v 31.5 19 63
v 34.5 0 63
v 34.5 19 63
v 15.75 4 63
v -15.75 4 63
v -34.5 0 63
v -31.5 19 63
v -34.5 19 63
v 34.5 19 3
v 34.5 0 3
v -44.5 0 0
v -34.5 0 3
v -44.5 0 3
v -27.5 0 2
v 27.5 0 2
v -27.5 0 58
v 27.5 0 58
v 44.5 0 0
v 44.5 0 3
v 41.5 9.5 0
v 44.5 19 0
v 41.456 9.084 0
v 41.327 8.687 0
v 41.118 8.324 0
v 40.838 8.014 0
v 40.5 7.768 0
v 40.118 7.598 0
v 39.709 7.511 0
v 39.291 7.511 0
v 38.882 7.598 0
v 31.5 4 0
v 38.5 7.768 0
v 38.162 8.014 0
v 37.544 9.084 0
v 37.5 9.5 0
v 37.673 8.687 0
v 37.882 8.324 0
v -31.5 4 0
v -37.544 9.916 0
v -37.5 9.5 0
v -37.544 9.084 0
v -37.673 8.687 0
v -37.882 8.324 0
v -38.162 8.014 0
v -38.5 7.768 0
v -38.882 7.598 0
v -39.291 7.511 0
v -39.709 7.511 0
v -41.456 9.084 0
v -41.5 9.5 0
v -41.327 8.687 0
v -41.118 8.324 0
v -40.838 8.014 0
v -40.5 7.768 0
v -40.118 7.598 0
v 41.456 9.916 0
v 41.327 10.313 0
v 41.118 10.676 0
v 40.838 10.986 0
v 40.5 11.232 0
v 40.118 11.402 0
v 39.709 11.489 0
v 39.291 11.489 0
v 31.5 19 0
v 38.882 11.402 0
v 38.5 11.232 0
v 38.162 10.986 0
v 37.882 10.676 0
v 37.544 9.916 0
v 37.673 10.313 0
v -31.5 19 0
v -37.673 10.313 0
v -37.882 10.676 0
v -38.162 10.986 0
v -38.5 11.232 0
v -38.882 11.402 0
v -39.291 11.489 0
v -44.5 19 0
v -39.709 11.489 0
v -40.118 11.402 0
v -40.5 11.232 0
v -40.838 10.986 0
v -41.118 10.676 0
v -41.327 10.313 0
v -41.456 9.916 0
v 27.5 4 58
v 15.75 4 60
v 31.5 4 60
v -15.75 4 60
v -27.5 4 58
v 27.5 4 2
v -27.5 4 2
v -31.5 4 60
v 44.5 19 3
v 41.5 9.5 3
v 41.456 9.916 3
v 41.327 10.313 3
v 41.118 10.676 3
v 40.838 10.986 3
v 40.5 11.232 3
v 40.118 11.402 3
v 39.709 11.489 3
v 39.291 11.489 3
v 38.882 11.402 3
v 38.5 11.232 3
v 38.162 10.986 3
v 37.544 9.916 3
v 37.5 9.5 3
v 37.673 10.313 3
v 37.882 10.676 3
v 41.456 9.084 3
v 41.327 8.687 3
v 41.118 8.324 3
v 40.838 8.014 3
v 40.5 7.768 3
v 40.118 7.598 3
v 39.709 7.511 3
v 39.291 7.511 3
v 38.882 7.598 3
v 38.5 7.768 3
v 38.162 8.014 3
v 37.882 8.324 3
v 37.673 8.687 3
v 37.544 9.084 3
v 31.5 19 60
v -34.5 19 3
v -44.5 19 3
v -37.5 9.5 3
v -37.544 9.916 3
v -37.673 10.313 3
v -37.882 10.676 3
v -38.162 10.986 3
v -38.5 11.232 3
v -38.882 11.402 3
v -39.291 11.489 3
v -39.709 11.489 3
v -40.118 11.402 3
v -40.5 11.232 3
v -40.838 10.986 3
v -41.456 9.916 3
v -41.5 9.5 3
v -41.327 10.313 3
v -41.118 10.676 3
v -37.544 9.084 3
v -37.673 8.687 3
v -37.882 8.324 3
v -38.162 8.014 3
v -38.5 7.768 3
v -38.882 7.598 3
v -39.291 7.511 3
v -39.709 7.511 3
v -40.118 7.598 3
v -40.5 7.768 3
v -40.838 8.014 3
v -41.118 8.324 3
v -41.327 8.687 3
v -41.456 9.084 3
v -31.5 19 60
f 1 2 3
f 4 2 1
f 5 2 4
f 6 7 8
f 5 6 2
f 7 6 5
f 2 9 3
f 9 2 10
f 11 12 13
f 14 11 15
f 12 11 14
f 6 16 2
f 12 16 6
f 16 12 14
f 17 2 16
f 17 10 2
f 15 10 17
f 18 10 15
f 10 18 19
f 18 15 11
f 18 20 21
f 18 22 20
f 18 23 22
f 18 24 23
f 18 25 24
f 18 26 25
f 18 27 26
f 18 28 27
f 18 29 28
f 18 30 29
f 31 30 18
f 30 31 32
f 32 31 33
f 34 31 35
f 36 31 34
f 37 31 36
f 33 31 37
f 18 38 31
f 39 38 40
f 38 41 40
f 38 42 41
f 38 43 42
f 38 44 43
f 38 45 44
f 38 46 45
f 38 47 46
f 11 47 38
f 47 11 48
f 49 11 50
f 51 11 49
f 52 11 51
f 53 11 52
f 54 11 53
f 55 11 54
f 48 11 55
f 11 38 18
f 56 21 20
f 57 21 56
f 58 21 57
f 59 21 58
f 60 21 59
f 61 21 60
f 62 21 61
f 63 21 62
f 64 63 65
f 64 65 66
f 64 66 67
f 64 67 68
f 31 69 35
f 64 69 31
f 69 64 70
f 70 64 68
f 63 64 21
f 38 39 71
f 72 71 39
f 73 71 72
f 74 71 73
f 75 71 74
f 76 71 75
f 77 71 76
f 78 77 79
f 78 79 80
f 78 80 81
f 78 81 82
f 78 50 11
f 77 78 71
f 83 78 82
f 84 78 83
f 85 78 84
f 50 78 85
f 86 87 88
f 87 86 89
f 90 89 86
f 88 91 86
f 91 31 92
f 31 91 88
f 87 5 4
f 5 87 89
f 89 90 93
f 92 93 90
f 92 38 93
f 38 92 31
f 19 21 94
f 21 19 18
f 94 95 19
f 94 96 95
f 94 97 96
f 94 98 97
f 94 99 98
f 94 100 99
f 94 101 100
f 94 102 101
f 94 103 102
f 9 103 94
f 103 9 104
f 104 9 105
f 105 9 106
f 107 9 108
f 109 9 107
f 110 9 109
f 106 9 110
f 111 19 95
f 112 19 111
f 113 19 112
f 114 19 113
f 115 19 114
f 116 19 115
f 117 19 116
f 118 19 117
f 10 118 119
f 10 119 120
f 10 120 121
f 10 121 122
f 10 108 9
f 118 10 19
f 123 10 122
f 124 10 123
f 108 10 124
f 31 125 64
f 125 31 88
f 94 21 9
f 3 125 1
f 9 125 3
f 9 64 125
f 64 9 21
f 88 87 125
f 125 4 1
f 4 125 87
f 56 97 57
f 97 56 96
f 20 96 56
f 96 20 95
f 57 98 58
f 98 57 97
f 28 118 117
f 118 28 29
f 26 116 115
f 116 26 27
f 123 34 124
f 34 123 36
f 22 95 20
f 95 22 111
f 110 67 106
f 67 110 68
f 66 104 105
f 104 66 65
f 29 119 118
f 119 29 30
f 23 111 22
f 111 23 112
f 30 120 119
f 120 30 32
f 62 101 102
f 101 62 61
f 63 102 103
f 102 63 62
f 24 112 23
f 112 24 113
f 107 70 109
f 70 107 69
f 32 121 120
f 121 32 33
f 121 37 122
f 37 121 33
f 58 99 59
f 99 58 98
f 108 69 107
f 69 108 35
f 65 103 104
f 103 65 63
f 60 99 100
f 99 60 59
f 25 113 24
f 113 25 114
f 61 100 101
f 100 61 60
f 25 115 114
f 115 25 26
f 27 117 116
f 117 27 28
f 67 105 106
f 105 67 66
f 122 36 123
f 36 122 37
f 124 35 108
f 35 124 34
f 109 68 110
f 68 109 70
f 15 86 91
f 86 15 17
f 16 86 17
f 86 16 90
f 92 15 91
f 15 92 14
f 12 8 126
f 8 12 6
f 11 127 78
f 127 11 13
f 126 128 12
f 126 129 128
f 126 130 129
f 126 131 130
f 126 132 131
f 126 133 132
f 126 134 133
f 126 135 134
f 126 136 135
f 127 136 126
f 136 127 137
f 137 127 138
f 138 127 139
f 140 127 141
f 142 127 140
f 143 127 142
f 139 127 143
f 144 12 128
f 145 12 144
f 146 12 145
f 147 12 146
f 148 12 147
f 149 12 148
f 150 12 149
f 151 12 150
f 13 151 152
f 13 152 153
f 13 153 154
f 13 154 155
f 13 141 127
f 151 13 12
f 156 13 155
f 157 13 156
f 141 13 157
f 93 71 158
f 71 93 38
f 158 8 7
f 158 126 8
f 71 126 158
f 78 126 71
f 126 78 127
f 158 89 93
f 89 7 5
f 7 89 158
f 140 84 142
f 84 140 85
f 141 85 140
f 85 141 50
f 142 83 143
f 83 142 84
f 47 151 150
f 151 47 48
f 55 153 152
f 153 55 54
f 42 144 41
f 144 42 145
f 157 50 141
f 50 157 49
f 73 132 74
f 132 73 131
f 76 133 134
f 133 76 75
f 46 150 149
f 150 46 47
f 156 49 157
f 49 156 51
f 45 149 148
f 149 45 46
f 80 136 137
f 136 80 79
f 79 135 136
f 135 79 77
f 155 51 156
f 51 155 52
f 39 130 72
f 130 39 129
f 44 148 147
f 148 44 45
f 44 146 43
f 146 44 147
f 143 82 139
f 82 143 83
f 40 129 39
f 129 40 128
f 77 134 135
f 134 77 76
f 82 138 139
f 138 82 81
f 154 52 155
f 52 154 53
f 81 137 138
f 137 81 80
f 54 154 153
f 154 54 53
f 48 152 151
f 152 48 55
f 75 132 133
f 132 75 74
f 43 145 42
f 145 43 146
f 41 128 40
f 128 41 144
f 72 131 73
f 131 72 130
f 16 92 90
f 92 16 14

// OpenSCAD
// Universelle Halterung für alles
// Universal bracket for everything

// Dicke von nicht-strukturellen Teilen
// thickness of non-structural parts
THK = 4; 

// Dicke der strukturellen Teile
// thickness of structural parts
thk = 3; 

// Breite (links-rechts) des Hubs
// left-right of the hub
x = 63; 

// Höhe (oben-unten) des Hubs
// tleft-right of the hub
z = 60; 

// Tiefe (vorne-hinten) des Teils
// front-back distance of the part
y = 15; 

// Durchmesser der Schraubenachse
// diameter of the screw shaft
screwD = 4;

// Durchmesser des Schraubenkopfs
// diameter of the screw head
headD = 10;

// Art des Schraubenkopfs
// type of screww head
headType = "BUTTON"; //[BUTTON, TAPER]

// Qualität der Rundungen (Anzahl der Segmente)
// quality of curved surfaces
$fn=30;

for(m=[0:1])
mirror([m,0,0])
difference() {
    union() {
        // Frontplatte
        // front panel
        hull() {
            cube([x/2+thk, THK, z+thk]);
            translate([x/4,0]) cube([x/4+thk, THK, z+thk]);
        }
        
        // Montage-Lasche
        // mounting tab
        translate([x/2,0]) cube([thk+headD, y+THK, thk]); //square screw tabs
        hull() {
            translate([x/2,0]) cube([thk, y+THK, thk]);
            translate([x/2+thk+headD/2, (THK+y)/2]) cylinder(d=headD, h=thk);
        }
        
        // Seitenplatte
        // side panel
        translate([x/2,0]) hull() {
            cube([thk, y+THK, z+thk]);
            cube([thk, y+THK, thk]);
        }
        
        // Fixierlasche oben
        // holddown tab
        hull() {
            translate([x/4, 0, z]) cube([x/4, THK, thk]);
            translate([x/2, 0, z]) cube([thk,y+THK,thk]);
        }
            
    }
    
    // Schraubenlöcher
    // screw holes
    translate([x/2+thk+headD/2, (THK+y)/2]) cylinder(d=screwD, thk*3, center=true);
    if(headType=="TAPER") 
    translate([x/2+thk+headD/2, (THK+y)/2,thk+0.01]) rotate([0,180]) cylinder(d1=headD,d2=0, h=headD/2);
    
    // zentrales Loch
    // center hole
    translate([0,0,z/2]) cube([x-2*THK, 99, z-THK],center=true);
}

echo(str("File name: Universal U Bracket ",x,"x",z));
